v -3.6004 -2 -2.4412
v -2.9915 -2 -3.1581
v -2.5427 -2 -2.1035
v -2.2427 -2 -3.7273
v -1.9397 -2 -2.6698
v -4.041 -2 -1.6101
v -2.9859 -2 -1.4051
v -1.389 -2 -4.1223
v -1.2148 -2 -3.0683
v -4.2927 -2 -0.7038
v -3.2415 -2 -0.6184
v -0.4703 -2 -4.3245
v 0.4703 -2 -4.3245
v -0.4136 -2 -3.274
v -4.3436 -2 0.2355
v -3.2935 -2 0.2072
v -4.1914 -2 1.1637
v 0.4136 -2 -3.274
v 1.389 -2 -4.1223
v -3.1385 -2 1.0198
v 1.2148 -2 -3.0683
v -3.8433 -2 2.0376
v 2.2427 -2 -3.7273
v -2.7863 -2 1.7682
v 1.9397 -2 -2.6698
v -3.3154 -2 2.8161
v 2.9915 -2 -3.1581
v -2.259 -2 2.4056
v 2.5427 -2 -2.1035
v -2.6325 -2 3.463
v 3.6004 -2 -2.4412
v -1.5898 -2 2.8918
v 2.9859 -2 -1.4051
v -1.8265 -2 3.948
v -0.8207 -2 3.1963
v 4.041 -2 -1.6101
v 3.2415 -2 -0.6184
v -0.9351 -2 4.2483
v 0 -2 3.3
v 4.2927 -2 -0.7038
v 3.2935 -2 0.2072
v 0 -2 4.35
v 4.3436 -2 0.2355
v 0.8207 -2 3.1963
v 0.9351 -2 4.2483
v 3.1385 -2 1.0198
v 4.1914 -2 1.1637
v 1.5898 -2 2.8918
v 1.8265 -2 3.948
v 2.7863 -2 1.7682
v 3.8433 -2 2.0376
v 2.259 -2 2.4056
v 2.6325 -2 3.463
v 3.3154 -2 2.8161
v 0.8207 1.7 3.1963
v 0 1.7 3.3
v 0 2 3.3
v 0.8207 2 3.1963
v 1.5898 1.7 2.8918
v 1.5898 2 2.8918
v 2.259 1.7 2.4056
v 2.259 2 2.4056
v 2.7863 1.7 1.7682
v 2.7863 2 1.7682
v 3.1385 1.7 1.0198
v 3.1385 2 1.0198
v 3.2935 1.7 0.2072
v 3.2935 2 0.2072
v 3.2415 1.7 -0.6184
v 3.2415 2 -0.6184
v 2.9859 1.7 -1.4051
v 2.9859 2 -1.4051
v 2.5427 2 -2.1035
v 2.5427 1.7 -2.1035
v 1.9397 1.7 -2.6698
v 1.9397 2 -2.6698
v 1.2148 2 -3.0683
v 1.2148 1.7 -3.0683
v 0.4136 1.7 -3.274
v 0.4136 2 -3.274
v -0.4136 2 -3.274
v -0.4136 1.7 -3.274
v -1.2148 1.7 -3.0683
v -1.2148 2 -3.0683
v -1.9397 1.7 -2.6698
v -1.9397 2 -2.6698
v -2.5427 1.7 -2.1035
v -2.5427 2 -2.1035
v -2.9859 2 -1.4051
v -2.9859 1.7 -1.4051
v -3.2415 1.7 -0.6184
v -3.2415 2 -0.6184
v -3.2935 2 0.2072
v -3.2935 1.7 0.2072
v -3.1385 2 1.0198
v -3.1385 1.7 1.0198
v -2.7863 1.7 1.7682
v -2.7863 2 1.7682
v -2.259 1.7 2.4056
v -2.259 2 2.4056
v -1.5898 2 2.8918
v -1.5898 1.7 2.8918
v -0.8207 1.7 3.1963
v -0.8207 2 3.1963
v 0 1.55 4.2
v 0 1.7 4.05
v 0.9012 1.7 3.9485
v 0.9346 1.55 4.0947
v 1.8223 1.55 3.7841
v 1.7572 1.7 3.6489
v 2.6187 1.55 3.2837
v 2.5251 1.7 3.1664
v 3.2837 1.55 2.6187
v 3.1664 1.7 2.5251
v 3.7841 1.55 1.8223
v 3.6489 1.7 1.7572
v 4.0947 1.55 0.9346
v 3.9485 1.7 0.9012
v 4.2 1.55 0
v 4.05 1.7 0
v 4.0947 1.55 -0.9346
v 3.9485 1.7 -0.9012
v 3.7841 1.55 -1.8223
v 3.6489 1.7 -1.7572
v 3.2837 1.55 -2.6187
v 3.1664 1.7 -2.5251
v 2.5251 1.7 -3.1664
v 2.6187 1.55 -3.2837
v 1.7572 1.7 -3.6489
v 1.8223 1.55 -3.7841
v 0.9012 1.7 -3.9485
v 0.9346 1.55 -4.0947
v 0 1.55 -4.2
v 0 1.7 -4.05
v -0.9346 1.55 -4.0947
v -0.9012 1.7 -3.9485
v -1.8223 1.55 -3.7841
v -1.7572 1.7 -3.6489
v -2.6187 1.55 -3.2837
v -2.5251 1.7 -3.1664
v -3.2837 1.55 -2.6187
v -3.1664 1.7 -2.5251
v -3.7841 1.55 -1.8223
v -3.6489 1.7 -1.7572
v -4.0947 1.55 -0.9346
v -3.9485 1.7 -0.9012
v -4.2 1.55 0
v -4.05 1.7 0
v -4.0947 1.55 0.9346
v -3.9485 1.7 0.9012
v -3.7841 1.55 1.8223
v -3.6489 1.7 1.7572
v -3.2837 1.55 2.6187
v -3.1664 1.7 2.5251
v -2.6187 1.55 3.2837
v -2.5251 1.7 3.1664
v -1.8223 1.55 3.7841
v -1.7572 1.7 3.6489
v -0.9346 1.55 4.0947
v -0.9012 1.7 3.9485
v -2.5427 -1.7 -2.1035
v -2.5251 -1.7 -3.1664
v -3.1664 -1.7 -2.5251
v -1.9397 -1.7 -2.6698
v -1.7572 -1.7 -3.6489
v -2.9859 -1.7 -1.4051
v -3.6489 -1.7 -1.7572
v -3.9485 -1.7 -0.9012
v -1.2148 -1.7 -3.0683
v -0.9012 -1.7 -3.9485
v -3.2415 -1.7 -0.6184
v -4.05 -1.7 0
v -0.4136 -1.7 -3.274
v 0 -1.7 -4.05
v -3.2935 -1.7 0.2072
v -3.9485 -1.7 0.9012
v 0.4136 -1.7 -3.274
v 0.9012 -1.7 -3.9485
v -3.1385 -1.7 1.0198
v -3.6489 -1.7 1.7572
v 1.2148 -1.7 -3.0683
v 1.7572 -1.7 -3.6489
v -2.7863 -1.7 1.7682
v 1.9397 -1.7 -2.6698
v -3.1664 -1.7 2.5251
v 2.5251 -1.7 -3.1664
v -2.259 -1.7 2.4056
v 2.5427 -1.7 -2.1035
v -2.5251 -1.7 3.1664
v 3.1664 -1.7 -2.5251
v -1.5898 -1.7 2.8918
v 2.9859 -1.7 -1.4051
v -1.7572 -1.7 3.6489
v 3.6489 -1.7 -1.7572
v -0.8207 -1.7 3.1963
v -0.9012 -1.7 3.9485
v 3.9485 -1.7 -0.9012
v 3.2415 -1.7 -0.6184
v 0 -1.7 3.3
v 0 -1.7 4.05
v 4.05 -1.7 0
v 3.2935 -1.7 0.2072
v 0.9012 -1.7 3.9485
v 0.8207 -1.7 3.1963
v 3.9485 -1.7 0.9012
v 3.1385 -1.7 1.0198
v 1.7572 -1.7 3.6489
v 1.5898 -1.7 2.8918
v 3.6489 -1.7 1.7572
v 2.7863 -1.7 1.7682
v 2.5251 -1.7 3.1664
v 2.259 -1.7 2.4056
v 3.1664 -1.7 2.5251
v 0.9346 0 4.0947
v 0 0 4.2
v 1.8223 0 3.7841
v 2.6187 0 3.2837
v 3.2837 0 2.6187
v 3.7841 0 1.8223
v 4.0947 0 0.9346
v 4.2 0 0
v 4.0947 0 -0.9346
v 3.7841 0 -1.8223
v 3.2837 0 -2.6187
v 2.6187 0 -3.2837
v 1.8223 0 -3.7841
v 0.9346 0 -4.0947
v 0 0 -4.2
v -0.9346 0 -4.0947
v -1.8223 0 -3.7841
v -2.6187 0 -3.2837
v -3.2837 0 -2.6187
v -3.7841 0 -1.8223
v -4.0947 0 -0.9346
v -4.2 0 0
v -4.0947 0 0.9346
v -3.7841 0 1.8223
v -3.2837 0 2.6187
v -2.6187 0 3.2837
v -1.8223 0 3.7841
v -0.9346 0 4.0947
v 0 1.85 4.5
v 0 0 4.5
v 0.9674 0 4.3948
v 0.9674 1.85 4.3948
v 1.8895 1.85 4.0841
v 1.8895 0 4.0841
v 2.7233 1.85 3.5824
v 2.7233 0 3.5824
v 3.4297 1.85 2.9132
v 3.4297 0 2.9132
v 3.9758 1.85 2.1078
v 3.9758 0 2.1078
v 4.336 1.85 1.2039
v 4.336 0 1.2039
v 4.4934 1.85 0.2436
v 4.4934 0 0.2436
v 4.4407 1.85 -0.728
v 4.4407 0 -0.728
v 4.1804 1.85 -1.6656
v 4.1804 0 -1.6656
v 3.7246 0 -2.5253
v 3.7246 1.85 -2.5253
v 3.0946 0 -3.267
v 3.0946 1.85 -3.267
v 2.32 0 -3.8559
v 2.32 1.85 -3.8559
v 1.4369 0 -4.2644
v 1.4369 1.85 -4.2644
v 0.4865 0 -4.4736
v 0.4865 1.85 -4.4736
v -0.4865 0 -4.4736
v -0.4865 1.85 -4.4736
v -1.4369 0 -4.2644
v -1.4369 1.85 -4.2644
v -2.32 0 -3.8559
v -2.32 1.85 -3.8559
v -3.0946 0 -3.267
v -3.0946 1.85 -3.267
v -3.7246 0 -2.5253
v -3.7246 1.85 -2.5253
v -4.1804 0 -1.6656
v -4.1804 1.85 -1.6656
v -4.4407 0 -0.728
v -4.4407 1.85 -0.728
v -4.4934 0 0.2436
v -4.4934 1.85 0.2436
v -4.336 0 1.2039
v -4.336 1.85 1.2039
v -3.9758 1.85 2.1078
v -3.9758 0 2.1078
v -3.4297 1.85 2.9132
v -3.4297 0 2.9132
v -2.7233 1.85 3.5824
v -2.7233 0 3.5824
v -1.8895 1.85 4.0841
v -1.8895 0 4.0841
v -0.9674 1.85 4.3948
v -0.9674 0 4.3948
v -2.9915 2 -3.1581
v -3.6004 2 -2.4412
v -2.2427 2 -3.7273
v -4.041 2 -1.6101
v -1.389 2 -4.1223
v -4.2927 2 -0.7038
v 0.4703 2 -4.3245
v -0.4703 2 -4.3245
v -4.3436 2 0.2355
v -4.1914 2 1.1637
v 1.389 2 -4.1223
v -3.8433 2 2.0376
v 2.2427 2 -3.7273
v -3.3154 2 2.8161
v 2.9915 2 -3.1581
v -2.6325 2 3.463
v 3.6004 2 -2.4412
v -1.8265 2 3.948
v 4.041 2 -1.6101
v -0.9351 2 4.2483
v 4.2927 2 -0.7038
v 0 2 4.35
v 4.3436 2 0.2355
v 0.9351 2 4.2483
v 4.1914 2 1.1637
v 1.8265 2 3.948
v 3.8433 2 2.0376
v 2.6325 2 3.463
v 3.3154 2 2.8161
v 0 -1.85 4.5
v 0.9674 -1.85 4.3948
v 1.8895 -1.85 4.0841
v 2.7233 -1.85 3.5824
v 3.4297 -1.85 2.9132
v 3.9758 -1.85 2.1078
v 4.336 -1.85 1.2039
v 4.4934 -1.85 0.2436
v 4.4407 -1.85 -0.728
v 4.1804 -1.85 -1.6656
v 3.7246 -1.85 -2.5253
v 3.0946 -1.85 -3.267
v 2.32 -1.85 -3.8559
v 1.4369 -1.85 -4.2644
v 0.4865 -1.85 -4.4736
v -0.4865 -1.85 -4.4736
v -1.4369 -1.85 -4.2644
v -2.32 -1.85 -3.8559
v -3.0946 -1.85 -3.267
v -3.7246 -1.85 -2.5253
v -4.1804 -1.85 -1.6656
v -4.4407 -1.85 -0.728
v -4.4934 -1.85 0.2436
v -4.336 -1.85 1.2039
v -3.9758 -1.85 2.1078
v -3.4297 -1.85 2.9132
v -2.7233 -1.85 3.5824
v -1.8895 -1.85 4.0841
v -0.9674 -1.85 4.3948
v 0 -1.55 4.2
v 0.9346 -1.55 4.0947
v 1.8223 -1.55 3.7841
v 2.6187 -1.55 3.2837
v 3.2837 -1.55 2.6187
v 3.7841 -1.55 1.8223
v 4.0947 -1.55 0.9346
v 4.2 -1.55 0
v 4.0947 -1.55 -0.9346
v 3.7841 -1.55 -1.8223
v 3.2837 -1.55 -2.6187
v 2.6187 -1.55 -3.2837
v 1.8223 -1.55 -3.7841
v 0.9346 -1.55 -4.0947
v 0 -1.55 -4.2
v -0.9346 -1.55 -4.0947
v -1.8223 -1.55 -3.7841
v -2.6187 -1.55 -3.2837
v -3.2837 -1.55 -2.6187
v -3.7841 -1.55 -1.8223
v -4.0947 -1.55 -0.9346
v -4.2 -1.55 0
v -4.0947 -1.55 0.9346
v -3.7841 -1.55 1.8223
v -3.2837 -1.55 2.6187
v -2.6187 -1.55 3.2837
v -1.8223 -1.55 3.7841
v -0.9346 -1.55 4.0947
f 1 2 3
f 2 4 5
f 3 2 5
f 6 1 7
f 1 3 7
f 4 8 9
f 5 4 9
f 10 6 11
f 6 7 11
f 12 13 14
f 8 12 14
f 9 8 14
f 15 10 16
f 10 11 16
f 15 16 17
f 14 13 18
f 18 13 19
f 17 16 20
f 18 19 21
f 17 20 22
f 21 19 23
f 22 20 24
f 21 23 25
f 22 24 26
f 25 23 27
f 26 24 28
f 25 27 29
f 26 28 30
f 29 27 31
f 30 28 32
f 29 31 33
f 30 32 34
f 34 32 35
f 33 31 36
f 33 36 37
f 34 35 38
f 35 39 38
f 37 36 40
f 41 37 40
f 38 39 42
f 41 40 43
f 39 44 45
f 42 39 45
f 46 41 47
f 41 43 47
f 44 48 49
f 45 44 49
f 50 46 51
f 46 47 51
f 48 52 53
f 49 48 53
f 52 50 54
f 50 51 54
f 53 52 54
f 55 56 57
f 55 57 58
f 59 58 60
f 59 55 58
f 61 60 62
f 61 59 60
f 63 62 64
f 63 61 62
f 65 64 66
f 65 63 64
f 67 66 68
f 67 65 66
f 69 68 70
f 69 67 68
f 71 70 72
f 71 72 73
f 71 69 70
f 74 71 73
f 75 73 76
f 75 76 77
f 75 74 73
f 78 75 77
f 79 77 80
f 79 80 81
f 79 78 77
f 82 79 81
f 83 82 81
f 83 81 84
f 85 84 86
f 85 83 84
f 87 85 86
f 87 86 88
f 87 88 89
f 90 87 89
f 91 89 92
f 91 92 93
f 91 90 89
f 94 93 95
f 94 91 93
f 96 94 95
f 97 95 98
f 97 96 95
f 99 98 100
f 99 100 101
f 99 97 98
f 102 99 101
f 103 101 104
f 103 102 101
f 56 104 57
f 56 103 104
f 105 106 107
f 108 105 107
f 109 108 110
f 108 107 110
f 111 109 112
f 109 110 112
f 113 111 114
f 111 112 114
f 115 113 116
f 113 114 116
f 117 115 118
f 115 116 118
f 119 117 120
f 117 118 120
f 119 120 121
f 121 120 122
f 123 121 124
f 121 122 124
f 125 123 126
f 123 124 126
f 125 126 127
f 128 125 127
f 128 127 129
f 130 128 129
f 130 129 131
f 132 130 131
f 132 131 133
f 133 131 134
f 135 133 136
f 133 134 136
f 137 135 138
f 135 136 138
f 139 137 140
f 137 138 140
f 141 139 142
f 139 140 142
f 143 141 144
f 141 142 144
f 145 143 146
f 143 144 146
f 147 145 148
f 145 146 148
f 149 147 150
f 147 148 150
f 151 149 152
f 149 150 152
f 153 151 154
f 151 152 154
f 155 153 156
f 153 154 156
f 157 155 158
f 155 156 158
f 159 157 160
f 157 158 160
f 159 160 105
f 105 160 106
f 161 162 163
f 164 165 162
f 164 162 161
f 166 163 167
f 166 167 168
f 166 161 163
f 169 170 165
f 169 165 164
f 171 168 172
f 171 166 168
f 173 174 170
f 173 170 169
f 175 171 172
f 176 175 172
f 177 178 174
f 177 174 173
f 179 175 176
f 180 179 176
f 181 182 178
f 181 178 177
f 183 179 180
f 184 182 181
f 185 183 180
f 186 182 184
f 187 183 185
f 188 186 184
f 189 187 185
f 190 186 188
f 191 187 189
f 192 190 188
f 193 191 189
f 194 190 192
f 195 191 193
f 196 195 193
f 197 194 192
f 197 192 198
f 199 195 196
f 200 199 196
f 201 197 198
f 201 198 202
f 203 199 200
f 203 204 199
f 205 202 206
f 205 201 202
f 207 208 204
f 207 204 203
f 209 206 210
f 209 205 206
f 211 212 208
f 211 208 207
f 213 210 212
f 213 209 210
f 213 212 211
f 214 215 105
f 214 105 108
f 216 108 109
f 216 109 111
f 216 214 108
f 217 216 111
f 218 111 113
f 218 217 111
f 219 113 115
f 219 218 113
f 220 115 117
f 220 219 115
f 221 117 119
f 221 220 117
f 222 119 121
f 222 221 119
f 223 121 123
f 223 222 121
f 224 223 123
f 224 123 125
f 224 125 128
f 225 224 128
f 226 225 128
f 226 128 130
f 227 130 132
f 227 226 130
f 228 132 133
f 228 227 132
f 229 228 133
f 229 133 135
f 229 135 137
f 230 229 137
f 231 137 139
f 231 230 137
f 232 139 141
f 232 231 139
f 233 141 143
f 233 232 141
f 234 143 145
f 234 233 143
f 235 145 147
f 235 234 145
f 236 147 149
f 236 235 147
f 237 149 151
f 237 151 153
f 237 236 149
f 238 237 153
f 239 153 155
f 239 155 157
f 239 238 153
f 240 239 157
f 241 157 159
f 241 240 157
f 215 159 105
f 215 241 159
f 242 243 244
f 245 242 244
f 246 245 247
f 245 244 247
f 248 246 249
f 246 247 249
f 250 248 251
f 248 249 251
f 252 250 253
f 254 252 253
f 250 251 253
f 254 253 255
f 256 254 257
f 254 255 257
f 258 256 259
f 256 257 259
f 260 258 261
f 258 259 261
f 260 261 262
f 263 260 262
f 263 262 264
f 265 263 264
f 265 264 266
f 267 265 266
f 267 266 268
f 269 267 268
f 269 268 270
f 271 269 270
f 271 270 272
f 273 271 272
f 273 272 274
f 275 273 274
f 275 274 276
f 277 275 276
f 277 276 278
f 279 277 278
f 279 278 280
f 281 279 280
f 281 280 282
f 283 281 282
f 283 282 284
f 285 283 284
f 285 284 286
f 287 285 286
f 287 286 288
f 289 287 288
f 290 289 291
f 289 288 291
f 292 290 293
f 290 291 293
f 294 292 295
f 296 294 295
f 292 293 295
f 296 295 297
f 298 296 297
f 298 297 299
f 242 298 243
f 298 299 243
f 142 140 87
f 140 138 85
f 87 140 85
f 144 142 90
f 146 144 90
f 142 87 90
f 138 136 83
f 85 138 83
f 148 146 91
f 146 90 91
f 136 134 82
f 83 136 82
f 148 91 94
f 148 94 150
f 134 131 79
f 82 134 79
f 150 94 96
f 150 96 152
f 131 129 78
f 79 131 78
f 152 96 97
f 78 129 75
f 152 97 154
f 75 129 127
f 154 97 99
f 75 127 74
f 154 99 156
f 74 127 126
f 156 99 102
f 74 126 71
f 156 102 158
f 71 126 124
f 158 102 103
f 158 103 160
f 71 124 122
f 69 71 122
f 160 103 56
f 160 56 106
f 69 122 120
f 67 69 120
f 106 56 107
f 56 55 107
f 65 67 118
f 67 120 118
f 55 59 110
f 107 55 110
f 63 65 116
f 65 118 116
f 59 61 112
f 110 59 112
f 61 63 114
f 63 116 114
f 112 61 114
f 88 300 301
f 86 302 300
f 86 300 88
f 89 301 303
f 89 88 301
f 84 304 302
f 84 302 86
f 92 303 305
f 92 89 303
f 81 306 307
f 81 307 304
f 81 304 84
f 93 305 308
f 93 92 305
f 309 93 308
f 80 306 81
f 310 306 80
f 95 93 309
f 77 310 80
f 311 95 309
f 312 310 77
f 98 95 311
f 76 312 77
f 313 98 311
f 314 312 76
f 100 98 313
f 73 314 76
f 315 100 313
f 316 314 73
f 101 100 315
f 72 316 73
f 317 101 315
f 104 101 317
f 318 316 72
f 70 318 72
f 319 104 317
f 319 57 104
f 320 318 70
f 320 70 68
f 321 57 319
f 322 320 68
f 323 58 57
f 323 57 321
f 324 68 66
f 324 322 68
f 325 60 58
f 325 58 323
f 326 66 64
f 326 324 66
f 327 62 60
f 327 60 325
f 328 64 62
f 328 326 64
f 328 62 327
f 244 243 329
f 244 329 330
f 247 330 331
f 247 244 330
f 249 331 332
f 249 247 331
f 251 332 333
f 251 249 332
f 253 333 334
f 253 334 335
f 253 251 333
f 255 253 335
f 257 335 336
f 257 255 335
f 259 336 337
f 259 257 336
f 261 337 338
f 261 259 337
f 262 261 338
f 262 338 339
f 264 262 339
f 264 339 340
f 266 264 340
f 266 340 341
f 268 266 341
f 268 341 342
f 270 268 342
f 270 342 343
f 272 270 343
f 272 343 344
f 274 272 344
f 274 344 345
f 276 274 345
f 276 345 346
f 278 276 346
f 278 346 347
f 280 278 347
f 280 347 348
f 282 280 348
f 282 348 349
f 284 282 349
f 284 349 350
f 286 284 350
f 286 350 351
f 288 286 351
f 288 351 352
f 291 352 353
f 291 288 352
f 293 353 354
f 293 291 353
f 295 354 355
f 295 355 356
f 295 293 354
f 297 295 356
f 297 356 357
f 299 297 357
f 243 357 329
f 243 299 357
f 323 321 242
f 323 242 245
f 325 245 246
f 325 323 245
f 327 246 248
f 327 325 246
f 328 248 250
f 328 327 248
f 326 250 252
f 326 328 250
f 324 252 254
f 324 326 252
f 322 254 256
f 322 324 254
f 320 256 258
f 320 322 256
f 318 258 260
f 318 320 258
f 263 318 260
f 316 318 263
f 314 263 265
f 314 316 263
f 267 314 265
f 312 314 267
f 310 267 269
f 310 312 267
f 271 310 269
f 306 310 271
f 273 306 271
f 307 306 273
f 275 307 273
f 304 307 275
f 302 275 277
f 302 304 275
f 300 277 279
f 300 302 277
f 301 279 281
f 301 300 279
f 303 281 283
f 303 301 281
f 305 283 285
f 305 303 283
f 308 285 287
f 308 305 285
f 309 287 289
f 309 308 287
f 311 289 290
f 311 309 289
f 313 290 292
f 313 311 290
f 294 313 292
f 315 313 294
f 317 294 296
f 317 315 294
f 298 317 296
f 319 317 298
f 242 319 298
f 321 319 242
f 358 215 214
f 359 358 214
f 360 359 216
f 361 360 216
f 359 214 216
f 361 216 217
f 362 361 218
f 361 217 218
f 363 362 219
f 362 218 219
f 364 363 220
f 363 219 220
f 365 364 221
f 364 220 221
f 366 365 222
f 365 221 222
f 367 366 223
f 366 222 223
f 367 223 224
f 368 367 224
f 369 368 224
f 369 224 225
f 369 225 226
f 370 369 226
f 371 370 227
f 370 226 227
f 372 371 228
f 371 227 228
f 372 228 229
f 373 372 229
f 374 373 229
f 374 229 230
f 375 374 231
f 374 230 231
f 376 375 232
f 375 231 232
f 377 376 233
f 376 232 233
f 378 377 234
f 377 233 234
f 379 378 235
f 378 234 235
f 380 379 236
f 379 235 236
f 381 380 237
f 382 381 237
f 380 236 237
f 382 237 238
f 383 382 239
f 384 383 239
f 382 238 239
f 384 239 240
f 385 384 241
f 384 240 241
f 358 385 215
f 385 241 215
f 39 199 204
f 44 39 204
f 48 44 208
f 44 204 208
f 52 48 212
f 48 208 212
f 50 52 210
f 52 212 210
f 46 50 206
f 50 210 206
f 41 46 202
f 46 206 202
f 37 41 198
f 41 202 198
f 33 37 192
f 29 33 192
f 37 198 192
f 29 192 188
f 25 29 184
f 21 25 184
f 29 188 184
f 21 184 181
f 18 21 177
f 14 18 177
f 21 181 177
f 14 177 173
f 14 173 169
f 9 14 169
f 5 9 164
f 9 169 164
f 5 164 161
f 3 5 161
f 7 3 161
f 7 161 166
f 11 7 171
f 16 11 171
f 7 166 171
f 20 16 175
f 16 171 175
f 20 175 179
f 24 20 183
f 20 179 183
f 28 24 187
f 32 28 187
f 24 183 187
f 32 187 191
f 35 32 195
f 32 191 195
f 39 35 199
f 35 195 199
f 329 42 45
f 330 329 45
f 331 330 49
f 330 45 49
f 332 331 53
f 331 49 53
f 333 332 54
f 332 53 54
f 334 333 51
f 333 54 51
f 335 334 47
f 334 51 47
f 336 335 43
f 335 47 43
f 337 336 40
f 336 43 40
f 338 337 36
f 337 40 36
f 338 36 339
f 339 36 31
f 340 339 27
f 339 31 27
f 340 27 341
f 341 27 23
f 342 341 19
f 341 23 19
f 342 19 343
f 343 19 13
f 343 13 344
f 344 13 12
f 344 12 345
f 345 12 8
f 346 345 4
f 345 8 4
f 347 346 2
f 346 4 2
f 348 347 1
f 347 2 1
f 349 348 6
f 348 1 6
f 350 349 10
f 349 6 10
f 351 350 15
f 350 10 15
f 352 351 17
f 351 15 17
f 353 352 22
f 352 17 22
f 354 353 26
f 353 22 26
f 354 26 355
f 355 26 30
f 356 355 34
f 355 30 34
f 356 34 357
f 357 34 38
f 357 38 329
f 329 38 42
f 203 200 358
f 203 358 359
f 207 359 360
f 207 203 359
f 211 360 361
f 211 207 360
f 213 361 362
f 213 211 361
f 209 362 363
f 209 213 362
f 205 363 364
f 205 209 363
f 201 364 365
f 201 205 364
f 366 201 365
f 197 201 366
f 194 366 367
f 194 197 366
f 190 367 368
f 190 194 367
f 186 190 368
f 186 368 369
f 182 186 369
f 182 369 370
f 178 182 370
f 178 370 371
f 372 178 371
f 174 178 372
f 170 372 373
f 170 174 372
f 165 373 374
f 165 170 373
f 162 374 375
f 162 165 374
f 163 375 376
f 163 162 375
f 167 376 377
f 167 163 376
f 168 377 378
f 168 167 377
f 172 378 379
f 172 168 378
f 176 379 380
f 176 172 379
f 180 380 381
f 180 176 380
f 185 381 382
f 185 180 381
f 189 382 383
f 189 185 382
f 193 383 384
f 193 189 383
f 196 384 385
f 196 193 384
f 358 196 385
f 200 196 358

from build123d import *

# Parameters (mm, degrees)
SKETCH1_R           = 4.5
SKETCH1_R_2         = 4.2
BOSS_EXTRUDE1_DEPTH = 1.7
SKETCH2_R           = 4.5
SKETCH2_R_2         = 3.3
BOSS_EXTRUDE2_DEPTH = 0.3
CHAMFER1_SIZE       = 0.15
CHAMFER2_SIZE       = 0.15


with BuildPart() as part:
    # Sketch1 → Boss-Extrude1 (new body)
    with BuildSketch(Plane(origin=(0, 0, 0), x_dir=(1, 0, 0), z_dir=(0, 1, 0))):
        with Locations(Location((0, 0, 0), (0, 0, 270))):
            Circle(SKETCH1_R)
        with Locations(Location((0, 0, 0), (0, 0, 270))):
            Circle(SKETCH1_R_2, mode=Mode.SUBTRACT)
    extrude(amount=BOSS_EXTRUDE1_DEPTH)

    # Sketch2 → Boss-Extrude2 (add)
    with BuildSketch(Plane(origin=(0, 1.7, 0), x_dir=(1, 0, 0), z_dir=(0, 1, 0))):
        with Locations(Location((0, 0, 0), (0, 0, 270))):
            Circle(SKETCH2_R)
        with Locations(Location((0, 0, 0), (0, 0, 270))):
            Circle(SKETCH2_R_2, mode=Mode.SUBTRACT)
    extrude(amount=BOSS_EXTRUDE2_DEPTH)

    # Chamfer1
    chamfer1_edges = [part.edges().sort_by_distance(p)[0] for p in [
        (0, 2, -4.5),
    ]]
    chamfer(chamfer1_edges, length=CHAMFER1_SIZE)

    # Chamfer2
    chamfer2_edges = [part.edges().sort_by_distance(p)[0] for p in [
        (0, 1.7, -4.2),
    ]]
    chamfer(chamfer2_edges, length=CHAMFER2_SIZE)

    # Mirror1: part across plane


with BuildPart() as part_1:
    add(part.part)
    add(part.part.mirror(Plane.ZX))


solid = part_1.part
